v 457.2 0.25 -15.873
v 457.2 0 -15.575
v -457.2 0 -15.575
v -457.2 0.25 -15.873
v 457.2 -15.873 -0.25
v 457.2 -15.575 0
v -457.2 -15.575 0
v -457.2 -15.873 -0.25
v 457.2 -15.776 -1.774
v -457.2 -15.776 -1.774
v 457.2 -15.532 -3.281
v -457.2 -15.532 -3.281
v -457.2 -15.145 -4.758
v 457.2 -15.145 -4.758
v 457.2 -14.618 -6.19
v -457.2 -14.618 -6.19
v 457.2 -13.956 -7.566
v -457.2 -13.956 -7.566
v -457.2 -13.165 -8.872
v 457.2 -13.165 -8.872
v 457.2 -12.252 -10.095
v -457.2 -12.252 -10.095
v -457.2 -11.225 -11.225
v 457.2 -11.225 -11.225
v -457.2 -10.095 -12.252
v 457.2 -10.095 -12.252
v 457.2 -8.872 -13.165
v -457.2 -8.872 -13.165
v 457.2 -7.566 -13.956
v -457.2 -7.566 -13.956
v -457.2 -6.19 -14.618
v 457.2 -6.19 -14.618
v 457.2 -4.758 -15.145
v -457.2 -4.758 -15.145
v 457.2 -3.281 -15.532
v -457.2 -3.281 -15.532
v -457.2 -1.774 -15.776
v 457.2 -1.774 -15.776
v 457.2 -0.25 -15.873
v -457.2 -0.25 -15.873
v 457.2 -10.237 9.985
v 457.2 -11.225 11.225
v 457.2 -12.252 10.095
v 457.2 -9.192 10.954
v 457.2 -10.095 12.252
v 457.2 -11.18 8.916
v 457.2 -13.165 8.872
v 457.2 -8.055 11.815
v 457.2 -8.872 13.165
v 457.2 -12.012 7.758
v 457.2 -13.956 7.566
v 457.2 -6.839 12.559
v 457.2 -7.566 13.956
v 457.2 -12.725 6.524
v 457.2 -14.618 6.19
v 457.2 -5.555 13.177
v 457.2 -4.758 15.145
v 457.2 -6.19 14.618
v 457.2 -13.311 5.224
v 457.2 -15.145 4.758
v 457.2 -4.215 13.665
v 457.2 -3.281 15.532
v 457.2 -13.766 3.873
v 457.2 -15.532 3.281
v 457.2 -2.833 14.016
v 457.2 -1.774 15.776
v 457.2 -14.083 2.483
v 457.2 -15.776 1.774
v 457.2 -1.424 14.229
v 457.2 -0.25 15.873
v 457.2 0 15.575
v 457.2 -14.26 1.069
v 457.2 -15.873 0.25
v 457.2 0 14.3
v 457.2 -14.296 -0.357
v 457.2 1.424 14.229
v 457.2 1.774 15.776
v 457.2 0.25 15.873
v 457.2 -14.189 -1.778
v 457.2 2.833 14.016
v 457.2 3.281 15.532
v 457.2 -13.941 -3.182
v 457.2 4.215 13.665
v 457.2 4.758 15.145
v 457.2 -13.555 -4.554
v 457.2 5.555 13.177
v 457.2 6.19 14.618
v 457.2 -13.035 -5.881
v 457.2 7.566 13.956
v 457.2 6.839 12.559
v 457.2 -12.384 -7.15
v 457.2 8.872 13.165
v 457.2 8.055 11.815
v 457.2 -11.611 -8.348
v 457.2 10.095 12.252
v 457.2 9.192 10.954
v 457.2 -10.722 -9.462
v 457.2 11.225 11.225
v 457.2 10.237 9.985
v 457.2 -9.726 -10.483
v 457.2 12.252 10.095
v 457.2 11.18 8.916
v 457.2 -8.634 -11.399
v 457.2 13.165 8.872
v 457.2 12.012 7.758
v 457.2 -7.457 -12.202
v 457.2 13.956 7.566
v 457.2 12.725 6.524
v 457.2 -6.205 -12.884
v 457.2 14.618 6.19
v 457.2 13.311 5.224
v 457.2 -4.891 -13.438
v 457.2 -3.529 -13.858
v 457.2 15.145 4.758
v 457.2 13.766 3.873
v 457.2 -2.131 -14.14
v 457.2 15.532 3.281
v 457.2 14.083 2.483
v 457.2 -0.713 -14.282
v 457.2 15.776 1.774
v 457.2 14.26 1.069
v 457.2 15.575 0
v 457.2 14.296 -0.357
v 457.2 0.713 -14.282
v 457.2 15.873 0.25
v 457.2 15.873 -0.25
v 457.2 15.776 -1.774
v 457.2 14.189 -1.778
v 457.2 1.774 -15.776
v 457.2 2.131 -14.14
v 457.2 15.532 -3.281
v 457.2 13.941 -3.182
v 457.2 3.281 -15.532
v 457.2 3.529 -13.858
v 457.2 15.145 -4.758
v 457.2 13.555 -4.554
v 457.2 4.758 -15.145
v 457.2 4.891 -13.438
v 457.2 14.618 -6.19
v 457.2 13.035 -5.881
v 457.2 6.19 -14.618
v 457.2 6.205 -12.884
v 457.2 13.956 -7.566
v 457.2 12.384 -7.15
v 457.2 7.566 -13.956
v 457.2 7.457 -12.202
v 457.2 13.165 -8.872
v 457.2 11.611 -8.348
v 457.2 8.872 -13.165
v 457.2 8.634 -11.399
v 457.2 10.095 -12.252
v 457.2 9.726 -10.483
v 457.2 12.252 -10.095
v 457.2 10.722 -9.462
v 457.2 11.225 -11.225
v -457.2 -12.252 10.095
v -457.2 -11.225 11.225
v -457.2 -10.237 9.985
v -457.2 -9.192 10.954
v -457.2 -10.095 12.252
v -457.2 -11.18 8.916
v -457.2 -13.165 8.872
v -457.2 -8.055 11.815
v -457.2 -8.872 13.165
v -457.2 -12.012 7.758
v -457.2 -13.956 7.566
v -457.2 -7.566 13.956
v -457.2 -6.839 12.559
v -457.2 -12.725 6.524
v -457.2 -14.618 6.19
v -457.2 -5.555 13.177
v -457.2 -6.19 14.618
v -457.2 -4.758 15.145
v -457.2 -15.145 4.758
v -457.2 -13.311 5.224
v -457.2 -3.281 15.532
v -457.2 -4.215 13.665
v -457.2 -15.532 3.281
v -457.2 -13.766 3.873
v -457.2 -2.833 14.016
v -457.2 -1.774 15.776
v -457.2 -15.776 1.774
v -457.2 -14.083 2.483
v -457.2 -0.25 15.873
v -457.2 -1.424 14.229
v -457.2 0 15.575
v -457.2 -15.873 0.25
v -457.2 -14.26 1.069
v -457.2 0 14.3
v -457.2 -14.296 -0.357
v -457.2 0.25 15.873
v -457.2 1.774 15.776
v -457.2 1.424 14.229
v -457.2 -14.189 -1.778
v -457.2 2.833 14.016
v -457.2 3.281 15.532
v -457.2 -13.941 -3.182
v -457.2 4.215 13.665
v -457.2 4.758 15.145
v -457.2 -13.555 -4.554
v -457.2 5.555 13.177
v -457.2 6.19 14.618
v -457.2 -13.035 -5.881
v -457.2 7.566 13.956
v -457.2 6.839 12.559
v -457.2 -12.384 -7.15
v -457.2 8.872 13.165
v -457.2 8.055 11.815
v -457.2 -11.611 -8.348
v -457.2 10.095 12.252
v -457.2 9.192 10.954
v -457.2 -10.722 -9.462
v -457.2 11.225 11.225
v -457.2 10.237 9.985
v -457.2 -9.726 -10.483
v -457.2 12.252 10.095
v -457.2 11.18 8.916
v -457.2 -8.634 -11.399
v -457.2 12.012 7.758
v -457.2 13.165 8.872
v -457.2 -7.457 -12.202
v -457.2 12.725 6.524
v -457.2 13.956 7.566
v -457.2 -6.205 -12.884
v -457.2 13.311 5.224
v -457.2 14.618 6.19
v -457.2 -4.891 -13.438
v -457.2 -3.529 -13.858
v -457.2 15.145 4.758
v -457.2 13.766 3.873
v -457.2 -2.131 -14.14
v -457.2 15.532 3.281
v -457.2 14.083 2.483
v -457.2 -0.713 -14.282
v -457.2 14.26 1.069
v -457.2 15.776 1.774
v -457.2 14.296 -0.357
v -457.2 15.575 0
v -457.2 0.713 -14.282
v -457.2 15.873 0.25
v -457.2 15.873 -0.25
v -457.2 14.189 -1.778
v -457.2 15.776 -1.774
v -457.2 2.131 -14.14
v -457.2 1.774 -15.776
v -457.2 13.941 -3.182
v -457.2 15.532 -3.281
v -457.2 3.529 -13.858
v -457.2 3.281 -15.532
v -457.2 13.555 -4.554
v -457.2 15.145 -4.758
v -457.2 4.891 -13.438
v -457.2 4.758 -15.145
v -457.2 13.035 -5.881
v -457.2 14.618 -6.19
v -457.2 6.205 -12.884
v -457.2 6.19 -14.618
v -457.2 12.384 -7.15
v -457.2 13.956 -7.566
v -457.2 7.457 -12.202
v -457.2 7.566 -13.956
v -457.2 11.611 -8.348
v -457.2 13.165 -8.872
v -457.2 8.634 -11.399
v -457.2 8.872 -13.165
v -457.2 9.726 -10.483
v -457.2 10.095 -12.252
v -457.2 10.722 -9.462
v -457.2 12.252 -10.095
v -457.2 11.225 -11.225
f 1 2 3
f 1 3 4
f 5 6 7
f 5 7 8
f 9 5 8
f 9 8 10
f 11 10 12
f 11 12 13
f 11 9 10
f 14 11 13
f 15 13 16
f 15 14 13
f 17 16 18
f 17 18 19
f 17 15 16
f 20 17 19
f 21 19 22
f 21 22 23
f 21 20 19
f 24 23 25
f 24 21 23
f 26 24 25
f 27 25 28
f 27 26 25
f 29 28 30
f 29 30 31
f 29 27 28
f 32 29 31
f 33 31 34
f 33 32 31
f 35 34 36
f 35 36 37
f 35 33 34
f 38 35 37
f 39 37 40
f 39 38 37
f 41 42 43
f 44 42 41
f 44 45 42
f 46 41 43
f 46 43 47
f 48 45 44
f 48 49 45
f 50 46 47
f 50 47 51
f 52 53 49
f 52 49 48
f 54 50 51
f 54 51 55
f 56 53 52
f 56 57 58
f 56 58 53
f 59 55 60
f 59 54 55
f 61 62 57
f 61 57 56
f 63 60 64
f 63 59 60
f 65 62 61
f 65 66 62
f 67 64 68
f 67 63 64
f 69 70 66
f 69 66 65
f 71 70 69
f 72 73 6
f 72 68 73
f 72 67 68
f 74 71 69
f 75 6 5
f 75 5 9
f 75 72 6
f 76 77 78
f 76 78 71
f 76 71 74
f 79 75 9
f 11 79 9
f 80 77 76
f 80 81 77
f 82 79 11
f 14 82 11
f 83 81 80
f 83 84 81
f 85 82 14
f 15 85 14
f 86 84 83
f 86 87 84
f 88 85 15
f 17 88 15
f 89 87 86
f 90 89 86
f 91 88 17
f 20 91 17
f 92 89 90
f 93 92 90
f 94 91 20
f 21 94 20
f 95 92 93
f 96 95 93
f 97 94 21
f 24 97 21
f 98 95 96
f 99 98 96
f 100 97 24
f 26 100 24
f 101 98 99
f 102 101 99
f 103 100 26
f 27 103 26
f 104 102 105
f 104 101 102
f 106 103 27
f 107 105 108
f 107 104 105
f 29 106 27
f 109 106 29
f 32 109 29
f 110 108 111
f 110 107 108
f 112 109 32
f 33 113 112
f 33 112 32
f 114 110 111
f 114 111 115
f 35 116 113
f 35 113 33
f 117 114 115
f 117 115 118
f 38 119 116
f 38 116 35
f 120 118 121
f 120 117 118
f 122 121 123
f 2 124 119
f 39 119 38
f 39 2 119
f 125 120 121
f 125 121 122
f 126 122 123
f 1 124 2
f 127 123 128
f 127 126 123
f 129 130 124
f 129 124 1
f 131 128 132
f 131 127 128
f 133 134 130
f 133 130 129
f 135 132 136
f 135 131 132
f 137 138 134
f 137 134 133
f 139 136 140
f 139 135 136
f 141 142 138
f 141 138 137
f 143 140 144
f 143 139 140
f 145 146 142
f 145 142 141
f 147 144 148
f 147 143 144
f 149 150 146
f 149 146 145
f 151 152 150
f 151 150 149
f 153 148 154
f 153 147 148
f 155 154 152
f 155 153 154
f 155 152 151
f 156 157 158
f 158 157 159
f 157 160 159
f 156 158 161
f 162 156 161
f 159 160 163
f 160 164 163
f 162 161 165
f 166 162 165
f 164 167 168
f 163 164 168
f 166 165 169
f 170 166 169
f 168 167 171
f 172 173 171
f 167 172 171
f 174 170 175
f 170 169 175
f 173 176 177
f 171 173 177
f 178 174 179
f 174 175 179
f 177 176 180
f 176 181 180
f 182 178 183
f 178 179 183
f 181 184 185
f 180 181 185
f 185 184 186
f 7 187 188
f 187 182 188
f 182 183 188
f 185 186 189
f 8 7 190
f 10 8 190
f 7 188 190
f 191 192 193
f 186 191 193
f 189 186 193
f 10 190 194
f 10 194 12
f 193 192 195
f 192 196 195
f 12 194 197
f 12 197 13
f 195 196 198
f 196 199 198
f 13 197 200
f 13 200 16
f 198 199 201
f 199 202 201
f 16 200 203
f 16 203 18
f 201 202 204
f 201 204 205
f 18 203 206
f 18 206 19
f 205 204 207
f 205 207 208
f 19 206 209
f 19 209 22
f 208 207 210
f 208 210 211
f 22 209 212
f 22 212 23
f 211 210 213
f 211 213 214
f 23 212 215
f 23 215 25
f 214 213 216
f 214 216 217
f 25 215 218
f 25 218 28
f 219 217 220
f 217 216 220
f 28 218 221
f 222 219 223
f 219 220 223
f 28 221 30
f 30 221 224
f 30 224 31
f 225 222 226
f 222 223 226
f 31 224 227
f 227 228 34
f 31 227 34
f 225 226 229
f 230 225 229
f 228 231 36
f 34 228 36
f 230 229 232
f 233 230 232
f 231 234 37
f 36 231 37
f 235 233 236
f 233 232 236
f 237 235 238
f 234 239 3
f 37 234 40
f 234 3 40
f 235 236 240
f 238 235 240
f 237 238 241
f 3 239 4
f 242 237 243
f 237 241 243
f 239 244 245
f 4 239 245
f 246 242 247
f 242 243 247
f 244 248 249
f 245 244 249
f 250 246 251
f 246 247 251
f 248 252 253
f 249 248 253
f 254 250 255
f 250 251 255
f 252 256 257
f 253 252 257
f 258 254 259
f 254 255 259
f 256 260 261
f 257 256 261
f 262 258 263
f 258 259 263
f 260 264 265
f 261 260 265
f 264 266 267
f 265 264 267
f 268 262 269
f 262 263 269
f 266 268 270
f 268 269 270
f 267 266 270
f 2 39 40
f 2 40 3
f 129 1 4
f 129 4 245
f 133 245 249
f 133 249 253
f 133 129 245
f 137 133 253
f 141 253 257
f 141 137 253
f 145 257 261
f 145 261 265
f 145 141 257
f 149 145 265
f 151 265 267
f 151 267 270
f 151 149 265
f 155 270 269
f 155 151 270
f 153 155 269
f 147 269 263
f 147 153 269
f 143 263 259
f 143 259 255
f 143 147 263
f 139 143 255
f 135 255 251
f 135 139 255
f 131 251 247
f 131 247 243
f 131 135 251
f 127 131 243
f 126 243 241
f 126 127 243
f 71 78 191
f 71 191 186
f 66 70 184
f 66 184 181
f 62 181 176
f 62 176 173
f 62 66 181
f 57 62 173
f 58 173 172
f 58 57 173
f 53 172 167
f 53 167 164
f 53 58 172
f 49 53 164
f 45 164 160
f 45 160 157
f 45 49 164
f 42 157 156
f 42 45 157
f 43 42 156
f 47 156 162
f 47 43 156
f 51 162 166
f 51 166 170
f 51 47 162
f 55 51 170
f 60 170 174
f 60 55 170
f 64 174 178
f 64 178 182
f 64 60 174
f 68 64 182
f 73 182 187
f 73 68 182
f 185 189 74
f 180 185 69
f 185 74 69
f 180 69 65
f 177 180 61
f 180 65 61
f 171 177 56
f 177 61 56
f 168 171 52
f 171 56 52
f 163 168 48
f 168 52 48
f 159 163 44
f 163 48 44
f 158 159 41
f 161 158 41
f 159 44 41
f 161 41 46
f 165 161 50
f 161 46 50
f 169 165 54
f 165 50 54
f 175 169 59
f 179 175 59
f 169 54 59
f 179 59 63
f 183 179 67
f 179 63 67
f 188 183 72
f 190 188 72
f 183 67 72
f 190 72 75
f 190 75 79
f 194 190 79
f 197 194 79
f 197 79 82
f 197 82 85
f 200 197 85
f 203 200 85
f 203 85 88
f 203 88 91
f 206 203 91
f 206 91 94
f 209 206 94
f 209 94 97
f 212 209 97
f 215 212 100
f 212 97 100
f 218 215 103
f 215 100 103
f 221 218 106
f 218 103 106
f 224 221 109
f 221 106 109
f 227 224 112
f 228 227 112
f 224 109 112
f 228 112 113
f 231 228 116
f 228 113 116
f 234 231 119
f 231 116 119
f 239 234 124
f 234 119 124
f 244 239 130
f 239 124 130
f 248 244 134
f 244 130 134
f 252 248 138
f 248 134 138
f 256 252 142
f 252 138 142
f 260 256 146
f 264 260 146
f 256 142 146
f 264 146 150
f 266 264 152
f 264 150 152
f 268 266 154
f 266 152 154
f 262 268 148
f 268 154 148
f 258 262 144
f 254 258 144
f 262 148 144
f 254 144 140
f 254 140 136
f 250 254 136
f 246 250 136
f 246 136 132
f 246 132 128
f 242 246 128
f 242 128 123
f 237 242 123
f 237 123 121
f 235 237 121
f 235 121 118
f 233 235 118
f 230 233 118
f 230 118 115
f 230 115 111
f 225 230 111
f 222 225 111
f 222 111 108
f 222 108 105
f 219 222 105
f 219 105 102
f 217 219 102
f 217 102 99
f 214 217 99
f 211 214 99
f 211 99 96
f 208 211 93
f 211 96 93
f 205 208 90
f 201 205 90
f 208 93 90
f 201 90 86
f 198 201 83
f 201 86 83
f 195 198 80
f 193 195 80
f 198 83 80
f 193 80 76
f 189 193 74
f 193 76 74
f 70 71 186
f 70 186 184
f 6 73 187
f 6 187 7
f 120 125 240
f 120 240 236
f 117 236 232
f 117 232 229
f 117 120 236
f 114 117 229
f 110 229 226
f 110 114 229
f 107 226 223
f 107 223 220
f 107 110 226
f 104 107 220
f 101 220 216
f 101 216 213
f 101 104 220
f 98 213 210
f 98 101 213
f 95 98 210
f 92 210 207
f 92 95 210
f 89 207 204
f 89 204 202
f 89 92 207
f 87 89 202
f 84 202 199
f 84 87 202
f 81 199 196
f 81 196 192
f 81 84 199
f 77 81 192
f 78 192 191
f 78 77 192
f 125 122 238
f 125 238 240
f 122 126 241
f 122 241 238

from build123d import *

# Parameters (mm, degrees)
SKETCH1_R           = 14.3
BOSS_EXTRUDE1_DEPTH = 914.4


with BuildPart() as part:
    # Sketch1 → Boss-Extrude1 (new body)
    with BuildSketch(Plane(origin=(457.2, 0, 0), x_dir=(0, 0, -1), z_dir=(1, 0, 0))):
        with BuildLine():
            Line((-0.25, -15.873031374), (0, -15.575))
            Line((0, -15.575), (0.25, -15.873031374))
            ThreePointArc((0.25, -15.873031374), (11.225320151, -11.225320151), (15.873031374, -0.25))
            Line((15.873031374, -0.25), (15.575, 0))
            Line((15.575, 0), (15.873031374, 0.25))
            ThreePointArc((15.873031374, 0.25), (11.225320151, 11.225320151), (0.25, 15.873031374))
            Line((0.25, 15.873031374), (0, 15.575))
            Line((0, 15.575), (-0.25, 15.873031374))
            ThreePointArc((-0.25, 15.873031374), (-11.225320151, 11.225320151), (-15.873031374, 0.25))
            Line((-15.873031374, 0.25), (-15.575, 0))
            Line((-15.575, 0), (-15.873031374, -0.25))
            ThreePointArc((-15.873031374, -0.25), (-11.225320151, -11.225320151), (-0.25, -15.873031374))
        make_face()
        with Locations(Location((0, 0, 0), (0, 0, 180))):
            Circle(SKETCH1_R, mode=Mode.SUBTRACT)
    extrude(amount=-BOSS_EXTRUDE1_DEPTH)


solid = part.part
